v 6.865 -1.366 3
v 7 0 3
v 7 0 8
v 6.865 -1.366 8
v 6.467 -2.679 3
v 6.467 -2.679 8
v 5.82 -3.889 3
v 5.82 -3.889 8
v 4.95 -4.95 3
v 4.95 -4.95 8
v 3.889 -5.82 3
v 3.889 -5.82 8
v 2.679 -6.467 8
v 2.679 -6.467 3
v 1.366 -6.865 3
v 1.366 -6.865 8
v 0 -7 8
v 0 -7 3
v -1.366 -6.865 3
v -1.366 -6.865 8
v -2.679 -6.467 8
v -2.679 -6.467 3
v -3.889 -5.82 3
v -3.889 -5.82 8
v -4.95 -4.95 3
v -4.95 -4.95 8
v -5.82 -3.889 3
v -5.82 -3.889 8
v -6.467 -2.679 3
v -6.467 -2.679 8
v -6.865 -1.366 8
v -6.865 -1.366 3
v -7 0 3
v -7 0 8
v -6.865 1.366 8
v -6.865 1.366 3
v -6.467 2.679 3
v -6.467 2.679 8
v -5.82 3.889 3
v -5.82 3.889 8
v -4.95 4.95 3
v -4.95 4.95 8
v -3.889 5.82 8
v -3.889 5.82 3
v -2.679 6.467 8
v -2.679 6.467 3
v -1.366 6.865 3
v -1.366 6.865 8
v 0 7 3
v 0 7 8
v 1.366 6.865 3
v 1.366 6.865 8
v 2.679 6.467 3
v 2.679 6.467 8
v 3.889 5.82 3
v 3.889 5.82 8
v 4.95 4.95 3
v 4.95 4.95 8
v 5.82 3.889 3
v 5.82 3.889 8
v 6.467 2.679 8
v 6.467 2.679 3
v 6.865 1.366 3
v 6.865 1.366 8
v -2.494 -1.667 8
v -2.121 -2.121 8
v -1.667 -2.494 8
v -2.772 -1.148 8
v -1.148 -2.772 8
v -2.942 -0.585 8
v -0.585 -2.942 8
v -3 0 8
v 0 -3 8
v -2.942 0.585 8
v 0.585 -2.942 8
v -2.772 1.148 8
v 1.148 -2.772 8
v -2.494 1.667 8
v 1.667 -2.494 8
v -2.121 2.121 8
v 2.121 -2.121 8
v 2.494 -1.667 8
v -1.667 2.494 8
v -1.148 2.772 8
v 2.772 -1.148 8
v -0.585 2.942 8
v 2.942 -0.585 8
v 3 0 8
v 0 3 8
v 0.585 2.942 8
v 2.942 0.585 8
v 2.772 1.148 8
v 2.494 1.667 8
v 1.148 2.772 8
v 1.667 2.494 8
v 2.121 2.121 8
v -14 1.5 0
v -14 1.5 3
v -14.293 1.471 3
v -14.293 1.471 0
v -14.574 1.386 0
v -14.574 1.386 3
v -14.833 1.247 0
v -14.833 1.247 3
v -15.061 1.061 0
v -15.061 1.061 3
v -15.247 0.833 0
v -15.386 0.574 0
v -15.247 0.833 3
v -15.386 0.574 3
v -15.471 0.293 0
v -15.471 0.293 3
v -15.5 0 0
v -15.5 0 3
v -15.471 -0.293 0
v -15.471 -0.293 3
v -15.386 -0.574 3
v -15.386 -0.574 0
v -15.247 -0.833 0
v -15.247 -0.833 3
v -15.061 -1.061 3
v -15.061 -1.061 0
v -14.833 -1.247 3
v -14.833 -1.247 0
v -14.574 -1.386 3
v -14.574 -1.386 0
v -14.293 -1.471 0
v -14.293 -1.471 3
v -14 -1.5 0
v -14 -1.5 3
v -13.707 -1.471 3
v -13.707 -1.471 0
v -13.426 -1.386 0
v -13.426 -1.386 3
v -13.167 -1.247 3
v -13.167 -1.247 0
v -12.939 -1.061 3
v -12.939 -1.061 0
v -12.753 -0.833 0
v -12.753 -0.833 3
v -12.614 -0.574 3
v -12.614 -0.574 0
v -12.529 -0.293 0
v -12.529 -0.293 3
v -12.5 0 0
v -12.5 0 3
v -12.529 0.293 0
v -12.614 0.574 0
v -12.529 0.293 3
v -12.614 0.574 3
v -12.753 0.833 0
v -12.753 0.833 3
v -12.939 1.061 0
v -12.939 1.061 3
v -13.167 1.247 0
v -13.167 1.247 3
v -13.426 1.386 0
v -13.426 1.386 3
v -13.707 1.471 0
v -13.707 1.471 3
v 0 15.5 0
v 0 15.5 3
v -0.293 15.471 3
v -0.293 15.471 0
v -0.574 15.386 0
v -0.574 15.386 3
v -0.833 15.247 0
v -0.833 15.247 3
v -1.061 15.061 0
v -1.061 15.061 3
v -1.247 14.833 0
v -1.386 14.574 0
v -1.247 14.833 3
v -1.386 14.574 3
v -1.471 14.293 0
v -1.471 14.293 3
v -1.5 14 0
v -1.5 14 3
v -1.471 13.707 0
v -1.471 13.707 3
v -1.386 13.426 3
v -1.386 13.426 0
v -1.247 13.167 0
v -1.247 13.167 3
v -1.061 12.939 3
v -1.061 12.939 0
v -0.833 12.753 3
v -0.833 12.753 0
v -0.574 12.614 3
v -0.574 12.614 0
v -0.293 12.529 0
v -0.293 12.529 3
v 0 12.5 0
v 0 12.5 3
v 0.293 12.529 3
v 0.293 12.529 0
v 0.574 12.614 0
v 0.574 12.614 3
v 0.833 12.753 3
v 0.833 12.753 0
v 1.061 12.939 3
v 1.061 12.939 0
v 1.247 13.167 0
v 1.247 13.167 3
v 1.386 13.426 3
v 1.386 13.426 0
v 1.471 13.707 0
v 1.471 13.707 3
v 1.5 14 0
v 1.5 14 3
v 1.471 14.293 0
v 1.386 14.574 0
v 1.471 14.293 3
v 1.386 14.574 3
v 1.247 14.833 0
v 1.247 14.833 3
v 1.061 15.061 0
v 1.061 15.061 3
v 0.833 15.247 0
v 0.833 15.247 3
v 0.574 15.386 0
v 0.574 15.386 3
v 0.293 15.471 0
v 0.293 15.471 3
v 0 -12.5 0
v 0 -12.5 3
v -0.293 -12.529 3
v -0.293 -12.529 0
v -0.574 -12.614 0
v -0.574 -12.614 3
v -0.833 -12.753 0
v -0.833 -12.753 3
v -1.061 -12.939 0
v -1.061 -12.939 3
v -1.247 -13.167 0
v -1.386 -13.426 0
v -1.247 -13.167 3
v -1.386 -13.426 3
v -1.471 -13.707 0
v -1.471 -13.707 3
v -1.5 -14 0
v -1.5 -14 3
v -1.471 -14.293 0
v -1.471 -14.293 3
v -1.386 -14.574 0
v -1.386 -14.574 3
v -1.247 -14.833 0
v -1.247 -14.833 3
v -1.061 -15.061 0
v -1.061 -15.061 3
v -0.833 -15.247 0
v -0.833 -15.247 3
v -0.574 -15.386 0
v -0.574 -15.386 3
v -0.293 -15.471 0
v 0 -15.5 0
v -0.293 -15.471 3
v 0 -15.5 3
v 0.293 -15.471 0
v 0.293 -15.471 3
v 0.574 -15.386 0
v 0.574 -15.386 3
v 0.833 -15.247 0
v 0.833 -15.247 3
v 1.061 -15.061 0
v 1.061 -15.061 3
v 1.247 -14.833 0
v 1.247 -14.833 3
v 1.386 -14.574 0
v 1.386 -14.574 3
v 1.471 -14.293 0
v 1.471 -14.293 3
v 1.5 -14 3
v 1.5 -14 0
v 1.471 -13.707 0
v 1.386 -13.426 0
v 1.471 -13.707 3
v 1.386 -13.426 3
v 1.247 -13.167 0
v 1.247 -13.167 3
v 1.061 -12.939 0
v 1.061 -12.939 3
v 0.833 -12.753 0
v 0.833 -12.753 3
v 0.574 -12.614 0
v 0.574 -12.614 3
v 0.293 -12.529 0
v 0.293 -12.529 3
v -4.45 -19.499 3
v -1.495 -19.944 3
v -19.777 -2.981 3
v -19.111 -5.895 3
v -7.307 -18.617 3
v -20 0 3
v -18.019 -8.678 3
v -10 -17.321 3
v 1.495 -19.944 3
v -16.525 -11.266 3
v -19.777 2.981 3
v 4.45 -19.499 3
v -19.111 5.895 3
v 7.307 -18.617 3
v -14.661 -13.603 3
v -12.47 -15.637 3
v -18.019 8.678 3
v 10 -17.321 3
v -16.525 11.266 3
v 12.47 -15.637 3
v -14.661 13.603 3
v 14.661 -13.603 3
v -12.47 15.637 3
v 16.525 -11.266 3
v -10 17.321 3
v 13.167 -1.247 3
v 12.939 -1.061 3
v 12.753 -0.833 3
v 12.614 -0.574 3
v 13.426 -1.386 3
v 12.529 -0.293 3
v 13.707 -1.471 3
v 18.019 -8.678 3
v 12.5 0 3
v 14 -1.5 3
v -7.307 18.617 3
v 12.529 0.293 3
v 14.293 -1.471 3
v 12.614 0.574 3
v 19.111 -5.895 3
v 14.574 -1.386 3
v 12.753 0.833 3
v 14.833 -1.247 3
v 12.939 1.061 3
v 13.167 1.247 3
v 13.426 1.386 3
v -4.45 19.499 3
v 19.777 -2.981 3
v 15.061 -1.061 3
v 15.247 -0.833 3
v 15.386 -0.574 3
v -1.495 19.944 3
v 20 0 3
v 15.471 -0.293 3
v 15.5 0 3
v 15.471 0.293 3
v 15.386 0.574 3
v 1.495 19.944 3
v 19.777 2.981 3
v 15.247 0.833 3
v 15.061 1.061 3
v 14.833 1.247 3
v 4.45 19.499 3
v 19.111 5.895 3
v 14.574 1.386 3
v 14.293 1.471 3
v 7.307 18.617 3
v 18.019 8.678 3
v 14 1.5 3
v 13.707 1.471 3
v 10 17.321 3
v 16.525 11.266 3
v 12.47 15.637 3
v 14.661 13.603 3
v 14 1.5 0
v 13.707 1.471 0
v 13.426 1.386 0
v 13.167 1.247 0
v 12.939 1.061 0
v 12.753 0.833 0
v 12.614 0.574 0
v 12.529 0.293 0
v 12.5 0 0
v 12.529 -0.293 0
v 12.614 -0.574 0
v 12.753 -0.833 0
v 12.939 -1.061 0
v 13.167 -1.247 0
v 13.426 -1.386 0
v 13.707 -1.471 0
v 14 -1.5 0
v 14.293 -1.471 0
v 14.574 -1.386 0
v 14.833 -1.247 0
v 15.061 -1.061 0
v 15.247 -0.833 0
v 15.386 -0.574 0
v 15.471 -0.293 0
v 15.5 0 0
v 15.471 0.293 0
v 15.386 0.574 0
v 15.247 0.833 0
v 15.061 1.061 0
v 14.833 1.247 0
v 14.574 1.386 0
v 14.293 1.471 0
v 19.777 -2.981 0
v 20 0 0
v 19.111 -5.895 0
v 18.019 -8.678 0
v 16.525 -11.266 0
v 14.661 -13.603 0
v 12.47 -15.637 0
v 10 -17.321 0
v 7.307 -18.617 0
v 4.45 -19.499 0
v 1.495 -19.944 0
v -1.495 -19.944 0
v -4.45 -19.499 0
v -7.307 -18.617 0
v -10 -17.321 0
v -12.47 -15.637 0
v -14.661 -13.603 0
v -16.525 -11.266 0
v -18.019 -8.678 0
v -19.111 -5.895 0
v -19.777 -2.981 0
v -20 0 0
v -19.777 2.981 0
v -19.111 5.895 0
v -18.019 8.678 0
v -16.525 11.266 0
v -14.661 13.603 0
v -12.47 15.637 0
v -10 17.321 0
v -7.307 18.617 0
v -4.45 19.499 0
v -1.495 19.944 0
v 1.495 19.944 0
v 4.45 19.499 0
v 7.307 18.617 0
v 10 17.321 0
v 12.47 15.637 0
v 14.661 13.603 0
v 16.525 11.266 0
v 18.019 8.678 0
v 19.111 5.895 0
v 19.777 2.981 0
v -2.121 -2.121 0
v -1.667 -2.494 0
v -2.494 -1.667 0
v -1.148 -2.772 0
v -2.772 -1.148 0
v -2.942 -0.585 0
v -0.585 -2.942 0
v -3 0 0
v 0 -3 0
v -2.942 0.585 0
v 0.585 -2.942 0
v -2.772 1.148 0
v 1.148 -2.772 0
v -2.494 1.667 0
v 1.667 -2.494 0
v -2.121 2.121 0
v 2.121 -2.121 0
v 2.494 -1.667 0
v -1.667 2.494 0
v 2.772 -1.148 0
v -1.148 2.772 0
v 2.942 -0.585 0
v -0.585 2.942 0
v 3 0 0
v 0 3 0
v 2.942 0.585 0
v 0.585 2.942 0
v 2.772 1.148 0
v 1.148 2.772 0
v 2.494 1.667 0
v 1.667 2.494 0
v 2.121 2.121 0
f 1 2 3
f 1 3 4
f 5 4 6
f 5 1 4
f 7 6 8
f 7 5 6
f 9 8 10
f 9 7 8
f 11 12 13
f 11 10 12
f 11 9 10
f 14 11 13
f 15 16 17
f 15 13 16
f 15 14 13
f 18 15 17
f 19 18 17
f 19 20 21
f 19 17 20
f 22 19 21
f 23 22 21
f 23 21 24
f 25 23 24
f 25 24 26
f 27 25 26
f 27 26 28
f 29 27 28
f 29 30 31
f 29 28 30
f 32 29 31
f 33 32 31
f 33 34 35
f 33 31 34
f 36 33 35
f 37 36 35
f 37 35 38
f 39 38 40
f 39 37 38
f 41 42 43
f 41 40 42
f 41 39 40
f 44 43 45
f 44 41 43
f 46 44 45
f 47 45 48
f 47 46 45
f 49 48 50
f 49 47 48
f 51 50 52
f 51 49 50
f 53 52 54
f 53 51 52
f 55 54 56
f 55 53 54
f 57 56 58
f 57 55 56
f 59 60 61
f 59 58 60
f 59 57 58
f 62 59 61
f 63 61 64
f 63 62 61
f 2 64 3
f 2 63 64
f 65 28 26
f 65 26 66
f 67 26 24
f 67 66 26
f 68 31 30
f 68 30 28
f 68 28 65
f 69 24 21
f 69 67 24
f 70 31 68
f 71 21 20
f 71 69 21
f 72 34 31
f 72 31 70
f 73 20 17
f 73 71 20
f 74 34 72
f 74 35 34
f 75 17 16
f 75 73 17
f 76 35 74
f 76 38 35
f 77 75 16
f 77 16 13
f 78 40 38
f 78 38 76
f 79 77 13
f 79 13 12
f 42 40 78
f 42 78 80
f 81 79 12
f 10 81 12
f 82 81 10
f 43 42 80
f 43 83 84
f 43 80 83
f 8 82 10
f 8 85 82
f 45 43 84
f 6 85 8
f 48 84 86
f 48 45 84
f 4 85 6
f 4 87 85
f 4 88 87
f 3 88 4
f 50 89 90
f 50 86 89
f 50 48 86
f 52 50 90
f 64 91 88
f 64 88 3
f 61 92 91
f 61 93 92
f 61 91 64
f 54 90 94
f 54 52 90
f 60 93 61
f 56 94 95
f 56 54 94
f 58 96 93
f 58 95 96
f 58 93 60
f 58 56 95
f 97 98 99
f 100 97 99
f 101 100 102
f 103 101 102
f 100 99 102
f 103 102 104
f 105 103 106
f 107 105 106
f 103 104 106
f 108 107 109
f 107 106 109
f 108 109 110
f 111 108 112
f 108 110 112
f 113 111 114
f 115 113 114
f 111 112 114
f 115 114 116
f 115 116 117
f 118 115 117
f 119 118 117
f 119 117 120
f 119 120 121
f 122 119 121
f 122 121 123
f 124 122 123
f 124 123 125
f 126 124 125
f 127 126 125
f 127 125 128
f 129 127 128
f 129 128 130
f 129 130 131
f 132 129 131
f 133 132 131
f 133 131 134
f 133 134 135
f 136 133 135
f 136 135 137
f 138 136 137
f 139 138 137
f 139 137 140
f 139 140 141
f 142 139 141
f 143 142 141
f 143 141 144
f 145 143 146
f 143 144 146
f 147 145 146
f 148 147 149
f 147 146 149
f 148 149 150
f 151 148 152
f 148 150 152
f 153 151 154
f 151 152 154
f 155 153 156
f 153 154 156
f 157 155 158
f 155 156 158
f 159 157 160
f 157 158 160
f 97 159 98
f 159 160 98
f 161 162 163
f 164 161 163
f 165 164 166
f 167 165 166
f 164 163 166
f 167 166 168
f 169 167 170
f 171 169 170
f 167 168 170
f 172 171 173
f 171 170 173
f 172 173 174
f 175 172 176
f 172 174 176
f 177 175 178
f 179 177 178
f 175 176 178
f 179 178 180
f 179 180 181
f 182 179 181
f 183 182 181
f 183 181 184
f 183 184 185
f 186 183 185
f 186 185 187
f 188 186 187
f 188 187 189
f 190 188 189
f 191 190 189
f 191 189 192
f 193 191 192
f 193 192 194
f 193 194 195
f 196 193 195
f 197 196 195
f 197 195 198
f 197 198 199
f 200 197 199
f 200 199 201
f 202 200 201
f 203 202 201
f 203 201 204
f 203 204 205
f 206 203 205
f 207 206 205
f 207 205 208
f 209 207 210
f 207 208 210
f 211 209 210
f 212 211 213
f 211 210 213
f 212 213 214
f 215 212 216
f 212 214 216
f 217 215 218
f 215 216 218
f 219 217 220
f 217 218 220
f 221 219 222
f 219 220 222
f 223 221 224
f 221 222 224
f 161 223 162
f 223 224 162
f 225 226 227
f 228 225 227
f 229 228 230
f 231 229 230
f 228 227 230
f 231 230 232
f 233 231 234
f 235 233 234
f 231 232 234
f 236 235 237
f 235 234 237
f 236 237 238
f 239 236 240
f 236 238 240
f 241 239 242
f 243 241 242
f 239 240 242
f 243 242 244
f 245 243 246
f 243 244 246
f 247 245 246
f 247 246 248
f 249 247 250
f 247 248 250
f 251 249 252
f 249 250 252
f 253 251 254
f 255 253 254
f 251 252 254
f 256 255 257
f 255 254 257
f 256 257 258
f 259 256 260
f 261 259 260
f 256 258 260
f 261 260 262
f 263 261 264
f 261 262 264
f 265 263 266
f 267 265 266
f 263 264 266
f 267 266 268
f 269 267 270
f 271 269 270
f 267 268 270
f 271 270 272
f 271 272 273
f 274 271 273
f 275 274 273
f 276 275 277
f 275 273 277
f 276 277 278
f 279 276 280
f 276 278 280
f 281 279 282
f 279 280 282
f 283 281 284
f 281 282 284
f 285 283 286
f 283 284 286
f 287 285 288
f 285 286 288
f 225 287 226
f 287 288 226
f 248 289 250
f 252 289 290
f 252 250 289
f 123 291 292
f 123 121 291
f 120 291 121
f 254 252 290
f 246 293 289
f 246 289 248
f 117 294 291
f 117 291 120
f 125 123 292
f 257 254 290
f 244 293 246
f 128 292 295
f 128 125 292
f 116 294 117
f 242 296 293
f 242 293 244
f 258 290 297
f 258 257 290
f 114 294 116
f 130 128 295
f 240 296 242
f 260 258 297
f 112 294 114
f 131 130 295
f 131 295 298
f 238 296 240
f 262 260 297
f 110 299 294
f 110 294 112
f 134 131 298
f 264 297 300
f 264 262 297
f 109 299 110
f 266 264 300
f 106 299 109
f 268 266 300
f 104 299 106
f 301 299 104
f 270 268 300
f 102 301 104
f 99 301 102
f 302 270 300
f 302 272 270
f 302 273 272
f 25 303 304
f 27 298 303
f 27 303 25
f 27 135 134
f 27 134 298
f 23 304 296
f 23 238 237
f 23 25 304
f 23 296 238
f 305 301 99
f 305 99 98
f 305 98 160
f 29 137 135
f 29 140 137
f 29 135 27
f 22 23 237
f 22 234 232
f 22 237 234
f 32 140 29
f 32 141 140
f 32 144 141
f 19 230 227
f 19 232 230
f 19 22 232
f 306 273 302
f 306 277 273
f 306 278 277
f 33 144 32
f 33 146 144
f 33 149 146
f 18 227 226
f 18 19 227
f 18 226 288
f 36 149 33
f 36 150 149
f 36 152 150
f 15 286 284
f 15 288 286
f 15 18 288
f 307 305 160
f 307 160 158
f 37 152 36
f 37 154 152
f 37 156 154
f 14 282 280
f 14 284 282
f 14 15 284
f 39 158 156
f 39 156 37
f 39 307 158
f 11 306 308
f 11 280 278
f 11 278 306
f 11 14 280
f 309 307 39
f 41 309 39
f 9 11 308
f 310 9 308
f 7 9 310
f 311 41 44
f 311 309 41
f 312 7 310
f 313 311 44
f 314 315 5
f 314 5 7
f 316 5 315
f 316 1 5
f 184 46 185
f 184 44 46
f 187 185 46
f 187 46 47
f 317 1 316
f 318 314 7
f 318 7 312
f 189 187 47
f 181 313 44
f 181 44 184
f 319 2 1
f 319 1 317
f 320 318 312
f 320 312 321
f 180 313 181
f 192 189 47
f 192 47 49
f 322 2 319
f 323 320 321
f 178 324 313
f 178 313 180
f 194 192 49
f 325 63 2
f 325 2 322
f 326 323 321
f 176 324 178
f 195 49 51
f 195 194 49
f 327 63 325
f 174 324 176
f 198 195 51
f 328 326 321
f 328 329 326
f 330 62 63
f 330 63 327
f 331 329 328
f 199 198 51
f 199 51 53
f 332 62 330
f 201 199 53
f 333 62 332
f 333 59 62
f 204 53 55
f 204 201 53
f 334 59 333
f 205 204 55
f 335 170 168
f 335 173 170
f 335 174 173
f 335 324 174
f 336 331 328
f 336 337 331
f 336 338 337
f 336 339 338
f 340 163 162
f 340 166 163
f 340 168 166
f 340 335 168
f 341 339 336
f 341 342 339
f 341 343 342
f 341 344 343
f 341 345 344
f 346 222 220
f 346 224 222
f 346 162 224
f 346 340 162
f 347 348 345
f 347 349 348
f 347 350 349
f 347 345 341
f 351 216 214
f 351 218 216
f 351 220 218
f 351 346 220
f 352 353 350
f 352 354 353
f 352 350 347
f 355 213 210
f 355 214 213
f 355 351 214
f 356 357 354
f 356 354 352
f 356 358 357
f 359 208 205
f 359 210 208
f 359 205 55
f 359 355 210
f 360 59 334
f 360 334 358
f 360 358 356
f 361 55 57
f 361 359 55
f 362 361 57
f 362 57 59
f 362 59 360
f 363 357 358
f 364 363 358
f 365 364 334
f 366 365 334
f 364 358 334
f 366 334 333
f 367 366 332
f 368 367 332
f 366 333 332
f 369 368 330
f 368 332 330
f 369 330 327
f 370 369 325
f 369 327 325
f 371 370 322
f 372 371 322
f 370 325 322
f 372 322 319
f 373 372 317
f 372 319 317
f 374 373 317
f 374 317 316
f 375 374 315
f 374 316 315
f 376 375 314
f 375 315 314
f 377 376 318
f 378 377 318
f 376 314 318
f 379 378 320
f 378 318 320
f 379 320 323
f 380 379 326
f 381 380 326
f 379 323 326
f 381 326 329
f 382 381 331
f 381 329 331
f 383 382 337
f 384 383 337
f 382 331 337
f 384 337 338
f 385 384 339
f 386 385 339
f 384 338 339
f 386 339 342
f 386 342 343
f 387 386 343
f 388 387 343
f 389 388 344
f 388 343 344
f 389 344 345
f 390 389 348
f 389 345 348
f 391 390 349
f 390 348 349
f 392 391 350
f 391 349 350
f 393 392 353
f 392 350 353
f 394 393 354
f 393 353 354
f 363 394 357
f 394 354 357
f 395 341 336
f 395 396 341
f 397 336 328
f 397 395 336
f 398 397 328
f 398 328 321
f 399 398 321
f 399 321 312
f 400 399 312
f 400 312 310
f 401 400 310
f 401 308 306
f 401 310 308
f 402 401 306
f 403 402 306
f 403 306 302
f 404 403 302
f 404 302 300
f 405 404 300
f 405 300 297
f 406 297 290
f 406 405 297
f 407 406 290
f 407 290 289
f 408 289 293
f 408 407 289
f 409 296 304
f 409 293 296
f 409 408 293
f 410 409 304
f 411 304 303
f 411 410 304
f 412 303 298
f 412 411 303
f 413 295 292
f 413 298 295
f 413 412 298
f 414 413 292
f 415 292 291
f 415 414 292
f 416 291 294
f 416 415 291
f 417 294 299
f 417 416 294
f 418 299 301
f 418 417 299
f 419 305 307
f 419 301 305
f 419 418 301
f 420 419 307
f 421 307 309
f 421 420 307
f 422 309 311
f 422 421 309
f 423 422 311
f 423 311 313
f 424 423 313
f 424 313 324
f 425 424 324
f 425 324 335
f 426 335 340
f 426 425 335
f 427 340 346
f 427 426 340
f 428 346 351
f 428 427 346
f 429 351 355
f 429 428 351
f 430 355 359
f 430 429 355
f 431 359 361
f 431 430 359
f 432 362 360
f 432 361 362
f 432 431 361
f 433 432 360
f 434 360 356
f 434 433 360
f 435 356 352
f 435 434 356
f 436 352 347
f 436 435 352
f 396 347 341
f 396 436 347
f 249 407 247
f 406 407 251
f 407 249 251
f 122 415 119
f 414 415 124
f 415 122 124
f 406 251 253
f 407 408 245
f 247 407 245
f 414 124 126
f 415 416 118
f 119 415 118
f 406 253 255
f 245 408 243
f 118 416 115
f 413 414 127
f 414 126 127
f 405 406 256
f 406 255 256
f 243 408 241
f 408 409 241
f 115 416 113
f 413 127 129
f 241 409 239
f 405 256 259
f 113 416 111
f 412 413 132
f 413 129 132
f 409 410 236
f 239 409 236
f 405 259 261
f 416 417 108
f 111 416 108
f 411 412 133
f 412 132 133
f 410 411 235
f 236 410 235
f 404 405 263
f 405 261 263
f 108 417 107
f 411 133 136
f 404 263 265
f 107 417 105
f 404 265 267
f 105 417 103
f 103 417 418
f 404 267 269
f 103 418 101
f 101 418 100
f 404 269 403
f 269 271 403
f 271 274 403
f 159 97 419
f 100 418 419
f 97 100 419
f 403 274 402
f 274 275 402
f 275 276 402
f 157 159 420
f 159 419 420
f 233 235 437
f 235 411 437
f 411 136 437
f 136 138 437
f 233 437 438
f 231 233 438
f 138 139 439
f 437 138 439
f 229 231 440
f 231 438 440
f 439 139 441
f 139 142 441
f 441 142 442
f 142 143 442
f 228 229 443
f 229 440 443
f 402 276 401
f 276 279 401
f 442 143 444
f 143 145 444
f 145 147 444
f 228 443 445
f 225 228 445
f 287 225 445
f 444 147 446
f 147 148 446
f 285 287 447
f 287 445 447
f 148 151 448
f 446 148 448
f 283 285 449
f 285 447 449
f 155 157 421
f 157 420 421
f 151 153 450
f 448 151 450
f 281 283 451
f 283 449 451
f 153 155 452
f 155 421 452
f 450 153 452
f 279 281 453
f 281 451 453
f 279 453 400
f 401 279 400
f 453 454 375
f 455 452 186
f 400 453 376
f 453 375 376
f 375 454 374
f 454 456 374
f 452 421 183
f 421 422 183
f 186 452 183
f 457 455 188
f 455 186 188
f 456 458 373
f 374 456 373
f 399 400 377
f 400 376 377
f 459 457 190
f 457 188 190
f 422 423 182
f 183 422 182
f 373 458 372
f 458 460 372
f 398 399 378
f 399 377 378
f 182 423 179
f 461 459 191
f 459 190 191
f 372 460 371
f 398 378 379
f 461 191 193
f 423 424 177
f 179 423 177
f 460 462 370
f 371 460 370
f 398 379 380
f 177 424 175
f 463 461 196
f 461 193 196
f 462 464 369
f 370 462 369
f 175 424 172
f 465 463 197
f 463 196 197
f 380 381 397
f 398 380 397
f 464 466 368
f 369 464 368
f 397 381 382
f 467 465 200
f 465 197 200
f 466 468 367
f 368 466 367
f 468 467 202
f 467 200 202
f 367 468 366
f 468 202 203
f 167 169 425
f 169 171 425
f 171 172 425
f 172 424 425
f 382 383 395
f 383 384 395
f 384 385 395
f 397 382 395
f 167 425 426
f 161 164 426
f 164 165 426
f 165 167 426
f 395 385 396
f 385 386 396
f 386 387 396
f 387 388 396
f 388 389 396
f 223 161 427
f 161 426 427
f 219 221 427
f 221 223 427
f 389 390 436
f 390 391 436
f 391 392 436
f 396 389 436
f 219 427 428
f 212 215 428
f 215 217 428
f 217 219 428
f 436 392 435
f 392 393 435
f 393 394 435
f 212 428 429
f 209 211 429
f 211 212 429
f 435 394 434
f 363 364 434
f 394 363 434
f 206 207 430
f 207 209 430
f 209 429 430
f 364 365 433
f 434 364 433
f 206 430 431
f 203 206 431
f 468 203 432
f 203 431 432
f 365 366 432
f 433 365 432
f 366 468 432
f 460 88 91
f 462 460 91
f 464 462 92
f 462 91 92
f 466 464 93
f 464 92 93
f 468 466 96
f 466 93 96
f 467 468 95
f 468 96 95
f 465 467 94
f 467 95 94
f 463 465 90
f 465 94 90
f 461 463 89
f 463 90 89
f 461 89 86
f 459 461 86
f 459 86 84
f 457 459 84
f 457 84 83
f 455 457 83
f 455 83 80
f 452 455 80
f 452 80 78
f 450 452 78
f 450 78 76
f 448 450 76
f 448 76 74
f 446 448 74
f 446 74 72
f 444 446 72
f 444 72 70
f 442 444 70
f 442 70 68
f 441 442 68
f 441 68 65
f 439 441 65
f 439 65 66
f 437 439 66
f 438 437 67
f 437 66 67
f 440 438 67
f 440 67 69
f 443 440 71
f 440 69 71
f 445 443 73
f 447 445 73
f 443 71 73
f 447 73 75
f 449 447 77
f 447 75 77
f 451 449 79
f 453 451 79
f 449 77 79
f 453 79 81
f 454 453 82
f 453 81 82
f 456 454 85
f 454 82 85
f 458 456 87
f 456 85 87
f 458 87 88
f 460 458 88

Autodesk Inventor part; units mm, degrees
ref_plane "YZ Plane" through (0, 0, 0) normal (1, 0, 0) x (0, 1, 0)
ref_plane "XZ Plane" through (0, 0, 0) normal (0, 1, 0) x (-1, 0, 0)
ref_plane "XY Plane" through (0, 0, 0) normal (0, 0, 1) x (1, 0, 0)
sketch "スケッチ1" plane through (0, 0, 0) normal (0, 0, 1) x (1, 0, 0)
  circle A0 centre (0, 0) radius 20
  dimension "d0" = 40
extrude "押し出し1" add sketch "スケッチ1" along normal blind 3
sketch "スケッチ2" plane through (0, 0, 3) normal (0, 0, 1) x (1, 0, 0)
  circle A0 centre (0, 0) radius 7
  dimension "d3" = 14
extrude "押し出し2" add sketch "スケッチ2" along normal blind 5
sketch "スケッチ3" plane through (0, 0, 8) normal (0, 0, 1) x (1, 0, 0)
  circle A0 centre (0, 0) radius 3
  dimension "d6" = 6
extrude "押し出し3" cut sketch "スケッチ3" against normal through all
sketch "スケッチ4" plane through (0, 0, 0) normal (0, 0, -1) x (-1, 0, 0)
  point P0 (0, 0)
  point P1 (0, 14)
  point P2 (0, -14)
  point P3 (14, 0)
  point P4 (-14, 0)
  dimension "d9" = 28
  dimension "d10" = 28
  dimension "d11" = 14
  dimension "d12" = 14
hole "穴1" at (0, 14, 0) at (0, -14, 0) at (-14, 0, 0) at (14, 0, 0) direction (0, 0, 1) diameter 3 end through all
sketch "スケッチ5" plane through (0, 0, 8) normal (0, 0, 1) x (1, 0, 0)
  point P0 (0, 0)
sketch "スケッチ6" plane through (0, 0, 0) normal (1, 0, 0) x (0, 1, 0)
  point P0 (0, 0)
equation "\"d11\" = 0.5 * d9"
equation "\"d12\" = 0.5 * d10"
properties part number "RD010_ギアDS0.5-80" material "PVC、無可塑"
